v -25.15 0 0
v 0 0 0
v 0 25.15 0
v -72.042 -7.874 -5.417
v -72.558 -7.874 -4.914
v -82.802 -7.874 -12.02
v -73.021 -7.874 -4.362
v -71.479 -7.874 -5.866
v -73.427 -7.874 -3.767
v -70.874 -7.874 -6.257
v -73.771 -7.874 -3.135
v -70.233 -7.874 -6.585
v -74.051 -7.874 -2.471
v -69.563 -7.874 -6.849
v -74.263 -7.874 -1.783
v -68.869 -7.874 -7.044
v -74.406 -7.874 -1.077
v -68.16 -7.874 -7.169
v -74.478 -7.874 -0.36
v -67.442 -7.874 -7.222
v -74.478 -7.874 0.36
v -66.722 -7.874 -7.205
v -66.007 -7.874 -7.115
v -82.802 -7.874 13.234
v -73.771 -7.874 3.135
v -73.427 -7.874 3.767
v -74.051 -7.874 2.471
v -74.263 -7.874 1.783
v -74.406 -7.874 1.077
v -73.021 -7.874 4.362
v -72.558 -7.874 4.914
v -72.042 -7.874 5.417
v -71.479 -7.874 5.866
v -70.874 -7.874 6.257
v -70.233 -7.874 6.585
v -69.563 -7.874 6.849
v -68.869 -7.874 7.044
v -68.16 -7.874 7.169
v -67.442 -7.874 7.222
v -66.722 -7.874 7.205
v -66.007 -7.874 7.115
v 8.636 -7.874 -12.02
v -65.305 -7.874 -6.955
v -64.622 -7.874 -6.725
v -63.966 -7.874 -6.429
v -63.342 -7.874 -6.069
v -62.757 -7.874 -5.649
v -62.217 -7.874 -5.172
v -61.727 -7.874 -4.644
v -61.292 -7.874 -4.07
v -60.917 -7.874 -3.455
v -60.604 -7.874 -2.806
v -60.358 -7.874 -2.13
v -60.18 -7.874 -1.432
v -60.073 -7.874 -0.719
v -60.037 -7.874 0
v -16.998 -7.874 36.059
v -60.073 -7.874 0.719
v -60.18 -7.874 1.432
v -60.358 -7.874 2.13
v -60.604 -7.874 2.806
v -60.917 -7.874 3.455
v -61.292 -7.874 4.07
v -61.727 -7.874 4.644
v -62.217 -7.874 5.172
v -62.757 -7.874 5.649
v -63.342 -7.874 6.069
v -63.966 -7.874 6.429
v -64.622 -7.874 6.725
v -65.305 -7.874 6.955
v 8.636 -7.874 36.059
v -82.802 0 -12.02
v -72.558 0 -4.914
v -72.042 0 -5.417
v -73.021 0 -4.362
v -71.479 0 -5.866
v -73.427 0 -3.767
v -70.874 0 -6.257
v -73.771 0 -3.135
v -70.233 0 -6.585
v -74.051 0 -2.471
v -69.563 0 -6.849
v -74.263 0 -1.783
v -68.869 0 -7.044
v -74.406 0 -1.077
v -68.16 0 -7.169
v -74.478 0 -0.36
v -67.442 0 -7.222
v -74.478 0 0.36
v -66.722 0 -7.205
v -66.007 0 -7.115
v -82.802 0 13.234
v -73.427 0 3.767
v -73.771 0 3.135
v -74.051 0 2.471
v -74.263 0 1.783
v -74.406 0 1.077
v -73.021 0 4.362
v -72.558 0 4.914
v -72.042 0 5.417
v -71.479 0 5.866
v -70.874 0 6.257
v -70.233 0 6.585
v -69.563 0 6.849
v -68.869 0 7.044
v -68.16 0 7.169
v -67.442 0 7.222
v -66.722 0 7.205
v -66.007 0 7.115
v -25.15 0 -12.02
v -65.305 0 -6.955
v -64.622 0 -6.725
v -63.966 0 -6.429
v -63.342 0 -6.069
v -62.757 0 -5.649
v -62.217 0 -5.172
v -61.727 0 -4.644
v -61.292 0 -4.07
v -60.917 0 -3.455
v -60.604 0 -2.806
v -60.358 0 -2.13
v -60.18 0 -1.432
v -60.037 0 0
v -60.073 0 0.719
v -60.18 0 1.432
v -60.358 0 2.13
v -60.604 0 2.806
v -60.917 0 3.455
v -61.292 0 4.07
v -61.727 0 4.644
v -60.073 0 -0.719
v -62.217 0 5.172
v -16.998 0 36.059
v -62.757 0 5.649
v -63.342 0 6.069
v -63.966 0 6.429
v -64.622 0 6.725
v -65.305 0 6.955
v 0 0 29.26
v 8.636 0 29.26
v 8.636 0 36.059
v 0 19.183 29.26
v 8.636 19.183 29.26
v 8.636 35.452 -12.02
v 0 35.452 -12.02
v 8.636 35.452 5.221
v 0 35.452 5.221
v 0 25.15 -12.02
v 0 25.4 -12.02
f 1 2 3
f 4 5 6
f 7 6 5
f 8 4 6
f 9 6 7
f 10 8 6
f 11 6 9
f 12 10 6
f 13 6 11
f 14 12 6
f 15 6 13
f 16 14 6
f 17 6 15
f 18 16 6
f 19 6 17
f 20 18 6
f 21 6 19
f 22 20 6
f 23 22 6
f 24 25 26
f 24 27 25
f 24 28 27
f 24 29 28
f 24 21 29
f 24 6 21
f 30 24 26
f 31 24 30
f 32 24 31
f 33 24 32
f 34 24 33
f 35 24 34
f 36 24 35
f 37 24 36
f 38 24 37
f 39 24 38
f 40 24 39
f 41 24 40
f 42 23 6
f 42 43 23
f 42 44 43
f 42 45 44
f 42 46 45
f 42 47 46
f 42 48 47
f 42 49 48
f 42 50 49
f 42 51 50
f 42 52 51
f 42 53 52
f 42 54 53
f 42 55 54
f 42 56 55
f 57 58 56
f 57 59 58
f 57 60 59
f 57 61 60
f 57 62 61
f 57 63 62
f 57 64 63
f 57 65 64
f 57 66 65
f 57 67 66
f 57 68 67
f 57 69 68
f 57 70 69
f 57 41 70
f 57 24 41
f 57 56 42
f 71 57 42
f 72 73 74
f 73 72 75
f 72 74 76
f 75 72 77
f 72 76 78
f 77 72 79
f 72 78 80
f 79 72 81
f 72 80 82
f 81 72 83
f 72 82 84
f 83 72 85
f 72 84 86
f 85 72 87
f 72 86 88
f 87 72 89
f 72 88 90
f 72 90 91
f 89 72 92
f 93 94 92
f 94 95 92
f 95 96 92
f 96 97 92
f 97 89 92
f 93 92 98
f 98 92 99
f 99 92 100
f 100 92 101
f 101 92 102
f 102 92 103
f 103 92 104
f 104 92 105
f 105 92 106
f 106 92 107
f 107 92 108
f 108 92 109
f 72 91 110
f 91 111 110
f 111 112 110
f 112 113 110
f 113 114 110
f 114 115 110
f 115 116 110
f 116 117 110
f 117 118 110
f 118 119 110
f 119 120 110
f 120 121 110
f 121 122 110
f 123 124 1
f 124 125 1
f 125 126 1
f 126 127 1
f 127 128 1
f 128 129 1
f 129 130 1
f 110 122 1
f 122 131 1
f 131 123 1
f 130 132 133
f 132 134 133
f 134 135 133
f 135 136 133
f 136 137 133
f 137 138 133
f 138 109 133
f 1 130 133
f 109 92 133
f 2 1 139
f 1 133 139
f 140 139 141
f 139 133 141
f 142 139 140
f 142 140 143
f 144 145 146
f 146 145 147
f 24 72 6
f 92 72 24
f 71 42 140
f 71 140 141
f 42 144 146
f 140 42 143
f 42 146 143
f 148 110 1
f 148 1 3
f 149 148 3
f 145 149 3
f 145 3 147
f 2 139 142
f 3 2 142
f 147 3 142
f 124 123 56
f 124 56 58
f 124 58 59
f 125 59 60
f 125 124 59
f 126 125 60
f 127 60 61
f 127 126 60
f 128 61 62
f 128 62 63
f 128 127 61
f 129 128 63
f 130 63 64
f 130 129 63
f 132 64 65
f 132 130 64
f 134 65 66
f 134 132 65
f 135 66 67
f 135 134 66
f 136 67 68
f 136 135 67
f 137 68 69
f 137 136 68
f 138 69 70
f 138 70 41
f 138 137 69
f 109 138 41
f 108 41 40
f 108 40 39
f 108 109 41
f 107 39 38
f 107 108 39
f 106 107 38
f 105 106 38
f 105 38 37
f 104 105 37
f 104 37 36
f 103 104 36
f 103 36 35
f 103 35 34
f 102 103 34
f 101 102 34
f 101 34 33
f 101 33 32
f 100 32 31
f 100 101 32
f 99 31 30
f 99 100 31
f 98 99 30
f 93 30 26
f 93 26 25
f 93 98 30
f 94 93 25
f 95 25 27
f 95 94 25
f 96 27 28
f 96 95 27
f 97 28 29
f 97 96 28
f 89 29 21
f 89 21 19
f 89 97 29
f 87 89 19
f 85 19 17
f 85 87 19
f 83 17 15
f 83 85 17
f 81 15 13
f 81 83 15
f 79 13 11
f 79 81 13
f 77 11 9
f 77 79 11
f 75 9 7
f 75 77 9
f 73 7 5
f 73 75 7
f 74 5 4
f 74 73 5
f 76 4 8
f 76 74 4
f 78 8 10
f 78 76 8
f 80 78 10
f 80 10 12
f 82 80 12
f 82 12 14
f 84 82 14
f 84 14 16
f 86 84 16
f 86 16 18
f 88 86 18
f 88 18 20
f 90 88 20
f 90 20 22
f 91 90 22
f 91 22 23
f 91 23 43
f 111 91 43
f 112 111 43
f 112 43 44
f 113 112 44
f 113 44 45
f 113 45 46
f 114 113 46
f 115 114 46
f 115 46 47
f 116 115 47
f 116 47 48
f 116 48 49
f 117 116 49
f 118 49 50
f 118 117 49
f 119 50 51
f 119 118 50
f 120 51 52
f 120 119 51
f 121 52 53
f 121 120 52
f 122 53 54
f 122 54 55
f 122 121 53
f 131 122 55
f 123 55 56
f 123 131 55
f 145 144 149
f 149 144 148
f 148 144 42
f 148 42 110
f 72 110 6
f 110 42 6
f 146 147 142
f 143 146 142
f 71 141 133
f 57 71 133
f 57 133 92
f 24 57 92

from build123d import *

# Parameters (mm, degrees)
F0_W        = 19.1829744726
F0_H        = 41.2798188627
F1_DEPTH    = 8.636
F2_W        = 65.804887563
F2_H        = 25.253537111
F2_R        = 7.2247324081
F3_DEPTH    = 7.874
F4_W        = 40.3897017241
F4_H        = 12.0197124779
F5_DEPTH    = 25.4
F6_T4_DEPTH = 221.0461057398


# Not quite as in the source:
# - a fillet or chamfer that OpenCascade refuses, or shapes differently, is made with other operations: its cross-section is extruded or revolved along the edge and cut away or added


with BuildPart() as f1:
    # F0 (on Right) → F1 (new body)
    with BuildSketch(Plane.YZ):
        with Locations((9.5914872363, 8.6201969534)):
            Rectangle(F0_W, F0_H)
        Polygon((35.4520790279, 5.2206832916), (19.1829744726, 29.2601063848), (19.1829744726, -12.0197124779), (35.4520790279, -12.0197124779), align=None)
    extrude(amount=F1_DEPTH)

    # F2 (on face) → F3 (join)
    with BuildSketch(Plane.XZ):
        Polygon((-16.9975720346, -12.0197124779), (8.636, -12.0197124779), (8.636, 36.0591337085), (-16.9975720346, 36.0591337085), (-16.9975720346, 13.2338246331), align=None)
        with Locations((-49.9000158161, 0.6070560776)):
            Rectangle(F2_W, F2_H)
        with Locations((-67.2618225217, 0)):
            Circle(F2_R, mode=Mode.SUBTRACT)
        Polygon((-82.8024595976, 13.2338246331), (-16.9975720346, 13.2338246331), (-16.9975720346, 36.0591337085), align=None)
    extrude(amount=F3_DEPTH)

    # F4 (on face) → F5 (join)
    with BuildSketch(Plane(origin=(0, 0, 0), x_dir=(-1, 0, 0), z_dir=(0, 1, 0))):
        with Locations((20.194850862, -6.009856239)):
            Rectangle(F4_W, F4_H)
    extrude(amount=F5_DEPTH)

    # F6: chamfer of 40.64 on 1 edges, made by hand


with BuildPart() as f6_tool2:
    # F6_s3 → F6_t4 (new body)
    with BuildSketch(Plane.XY.offset(-116.5329091089)):
        Polygon((-40.3897017241, -15.24), (0.2502982759, 25.4), (-40.3897017241, 25.4), align=None)
    extrude(amount=F6_T4_DEPTH)

    split(bisect_by=Plane.XZ, keep=Keep.BOTTOM)

    split(bisect_by=Plane.YZ, keep=Keep.BOTTOM)


with BuildPart() as f1_1:
    add(f1.part)

    # F6_t1: cut F6_tool2
    add(f6_tool2.part, mode=Mode.SUBTRACT)


solid = f1_1.part
